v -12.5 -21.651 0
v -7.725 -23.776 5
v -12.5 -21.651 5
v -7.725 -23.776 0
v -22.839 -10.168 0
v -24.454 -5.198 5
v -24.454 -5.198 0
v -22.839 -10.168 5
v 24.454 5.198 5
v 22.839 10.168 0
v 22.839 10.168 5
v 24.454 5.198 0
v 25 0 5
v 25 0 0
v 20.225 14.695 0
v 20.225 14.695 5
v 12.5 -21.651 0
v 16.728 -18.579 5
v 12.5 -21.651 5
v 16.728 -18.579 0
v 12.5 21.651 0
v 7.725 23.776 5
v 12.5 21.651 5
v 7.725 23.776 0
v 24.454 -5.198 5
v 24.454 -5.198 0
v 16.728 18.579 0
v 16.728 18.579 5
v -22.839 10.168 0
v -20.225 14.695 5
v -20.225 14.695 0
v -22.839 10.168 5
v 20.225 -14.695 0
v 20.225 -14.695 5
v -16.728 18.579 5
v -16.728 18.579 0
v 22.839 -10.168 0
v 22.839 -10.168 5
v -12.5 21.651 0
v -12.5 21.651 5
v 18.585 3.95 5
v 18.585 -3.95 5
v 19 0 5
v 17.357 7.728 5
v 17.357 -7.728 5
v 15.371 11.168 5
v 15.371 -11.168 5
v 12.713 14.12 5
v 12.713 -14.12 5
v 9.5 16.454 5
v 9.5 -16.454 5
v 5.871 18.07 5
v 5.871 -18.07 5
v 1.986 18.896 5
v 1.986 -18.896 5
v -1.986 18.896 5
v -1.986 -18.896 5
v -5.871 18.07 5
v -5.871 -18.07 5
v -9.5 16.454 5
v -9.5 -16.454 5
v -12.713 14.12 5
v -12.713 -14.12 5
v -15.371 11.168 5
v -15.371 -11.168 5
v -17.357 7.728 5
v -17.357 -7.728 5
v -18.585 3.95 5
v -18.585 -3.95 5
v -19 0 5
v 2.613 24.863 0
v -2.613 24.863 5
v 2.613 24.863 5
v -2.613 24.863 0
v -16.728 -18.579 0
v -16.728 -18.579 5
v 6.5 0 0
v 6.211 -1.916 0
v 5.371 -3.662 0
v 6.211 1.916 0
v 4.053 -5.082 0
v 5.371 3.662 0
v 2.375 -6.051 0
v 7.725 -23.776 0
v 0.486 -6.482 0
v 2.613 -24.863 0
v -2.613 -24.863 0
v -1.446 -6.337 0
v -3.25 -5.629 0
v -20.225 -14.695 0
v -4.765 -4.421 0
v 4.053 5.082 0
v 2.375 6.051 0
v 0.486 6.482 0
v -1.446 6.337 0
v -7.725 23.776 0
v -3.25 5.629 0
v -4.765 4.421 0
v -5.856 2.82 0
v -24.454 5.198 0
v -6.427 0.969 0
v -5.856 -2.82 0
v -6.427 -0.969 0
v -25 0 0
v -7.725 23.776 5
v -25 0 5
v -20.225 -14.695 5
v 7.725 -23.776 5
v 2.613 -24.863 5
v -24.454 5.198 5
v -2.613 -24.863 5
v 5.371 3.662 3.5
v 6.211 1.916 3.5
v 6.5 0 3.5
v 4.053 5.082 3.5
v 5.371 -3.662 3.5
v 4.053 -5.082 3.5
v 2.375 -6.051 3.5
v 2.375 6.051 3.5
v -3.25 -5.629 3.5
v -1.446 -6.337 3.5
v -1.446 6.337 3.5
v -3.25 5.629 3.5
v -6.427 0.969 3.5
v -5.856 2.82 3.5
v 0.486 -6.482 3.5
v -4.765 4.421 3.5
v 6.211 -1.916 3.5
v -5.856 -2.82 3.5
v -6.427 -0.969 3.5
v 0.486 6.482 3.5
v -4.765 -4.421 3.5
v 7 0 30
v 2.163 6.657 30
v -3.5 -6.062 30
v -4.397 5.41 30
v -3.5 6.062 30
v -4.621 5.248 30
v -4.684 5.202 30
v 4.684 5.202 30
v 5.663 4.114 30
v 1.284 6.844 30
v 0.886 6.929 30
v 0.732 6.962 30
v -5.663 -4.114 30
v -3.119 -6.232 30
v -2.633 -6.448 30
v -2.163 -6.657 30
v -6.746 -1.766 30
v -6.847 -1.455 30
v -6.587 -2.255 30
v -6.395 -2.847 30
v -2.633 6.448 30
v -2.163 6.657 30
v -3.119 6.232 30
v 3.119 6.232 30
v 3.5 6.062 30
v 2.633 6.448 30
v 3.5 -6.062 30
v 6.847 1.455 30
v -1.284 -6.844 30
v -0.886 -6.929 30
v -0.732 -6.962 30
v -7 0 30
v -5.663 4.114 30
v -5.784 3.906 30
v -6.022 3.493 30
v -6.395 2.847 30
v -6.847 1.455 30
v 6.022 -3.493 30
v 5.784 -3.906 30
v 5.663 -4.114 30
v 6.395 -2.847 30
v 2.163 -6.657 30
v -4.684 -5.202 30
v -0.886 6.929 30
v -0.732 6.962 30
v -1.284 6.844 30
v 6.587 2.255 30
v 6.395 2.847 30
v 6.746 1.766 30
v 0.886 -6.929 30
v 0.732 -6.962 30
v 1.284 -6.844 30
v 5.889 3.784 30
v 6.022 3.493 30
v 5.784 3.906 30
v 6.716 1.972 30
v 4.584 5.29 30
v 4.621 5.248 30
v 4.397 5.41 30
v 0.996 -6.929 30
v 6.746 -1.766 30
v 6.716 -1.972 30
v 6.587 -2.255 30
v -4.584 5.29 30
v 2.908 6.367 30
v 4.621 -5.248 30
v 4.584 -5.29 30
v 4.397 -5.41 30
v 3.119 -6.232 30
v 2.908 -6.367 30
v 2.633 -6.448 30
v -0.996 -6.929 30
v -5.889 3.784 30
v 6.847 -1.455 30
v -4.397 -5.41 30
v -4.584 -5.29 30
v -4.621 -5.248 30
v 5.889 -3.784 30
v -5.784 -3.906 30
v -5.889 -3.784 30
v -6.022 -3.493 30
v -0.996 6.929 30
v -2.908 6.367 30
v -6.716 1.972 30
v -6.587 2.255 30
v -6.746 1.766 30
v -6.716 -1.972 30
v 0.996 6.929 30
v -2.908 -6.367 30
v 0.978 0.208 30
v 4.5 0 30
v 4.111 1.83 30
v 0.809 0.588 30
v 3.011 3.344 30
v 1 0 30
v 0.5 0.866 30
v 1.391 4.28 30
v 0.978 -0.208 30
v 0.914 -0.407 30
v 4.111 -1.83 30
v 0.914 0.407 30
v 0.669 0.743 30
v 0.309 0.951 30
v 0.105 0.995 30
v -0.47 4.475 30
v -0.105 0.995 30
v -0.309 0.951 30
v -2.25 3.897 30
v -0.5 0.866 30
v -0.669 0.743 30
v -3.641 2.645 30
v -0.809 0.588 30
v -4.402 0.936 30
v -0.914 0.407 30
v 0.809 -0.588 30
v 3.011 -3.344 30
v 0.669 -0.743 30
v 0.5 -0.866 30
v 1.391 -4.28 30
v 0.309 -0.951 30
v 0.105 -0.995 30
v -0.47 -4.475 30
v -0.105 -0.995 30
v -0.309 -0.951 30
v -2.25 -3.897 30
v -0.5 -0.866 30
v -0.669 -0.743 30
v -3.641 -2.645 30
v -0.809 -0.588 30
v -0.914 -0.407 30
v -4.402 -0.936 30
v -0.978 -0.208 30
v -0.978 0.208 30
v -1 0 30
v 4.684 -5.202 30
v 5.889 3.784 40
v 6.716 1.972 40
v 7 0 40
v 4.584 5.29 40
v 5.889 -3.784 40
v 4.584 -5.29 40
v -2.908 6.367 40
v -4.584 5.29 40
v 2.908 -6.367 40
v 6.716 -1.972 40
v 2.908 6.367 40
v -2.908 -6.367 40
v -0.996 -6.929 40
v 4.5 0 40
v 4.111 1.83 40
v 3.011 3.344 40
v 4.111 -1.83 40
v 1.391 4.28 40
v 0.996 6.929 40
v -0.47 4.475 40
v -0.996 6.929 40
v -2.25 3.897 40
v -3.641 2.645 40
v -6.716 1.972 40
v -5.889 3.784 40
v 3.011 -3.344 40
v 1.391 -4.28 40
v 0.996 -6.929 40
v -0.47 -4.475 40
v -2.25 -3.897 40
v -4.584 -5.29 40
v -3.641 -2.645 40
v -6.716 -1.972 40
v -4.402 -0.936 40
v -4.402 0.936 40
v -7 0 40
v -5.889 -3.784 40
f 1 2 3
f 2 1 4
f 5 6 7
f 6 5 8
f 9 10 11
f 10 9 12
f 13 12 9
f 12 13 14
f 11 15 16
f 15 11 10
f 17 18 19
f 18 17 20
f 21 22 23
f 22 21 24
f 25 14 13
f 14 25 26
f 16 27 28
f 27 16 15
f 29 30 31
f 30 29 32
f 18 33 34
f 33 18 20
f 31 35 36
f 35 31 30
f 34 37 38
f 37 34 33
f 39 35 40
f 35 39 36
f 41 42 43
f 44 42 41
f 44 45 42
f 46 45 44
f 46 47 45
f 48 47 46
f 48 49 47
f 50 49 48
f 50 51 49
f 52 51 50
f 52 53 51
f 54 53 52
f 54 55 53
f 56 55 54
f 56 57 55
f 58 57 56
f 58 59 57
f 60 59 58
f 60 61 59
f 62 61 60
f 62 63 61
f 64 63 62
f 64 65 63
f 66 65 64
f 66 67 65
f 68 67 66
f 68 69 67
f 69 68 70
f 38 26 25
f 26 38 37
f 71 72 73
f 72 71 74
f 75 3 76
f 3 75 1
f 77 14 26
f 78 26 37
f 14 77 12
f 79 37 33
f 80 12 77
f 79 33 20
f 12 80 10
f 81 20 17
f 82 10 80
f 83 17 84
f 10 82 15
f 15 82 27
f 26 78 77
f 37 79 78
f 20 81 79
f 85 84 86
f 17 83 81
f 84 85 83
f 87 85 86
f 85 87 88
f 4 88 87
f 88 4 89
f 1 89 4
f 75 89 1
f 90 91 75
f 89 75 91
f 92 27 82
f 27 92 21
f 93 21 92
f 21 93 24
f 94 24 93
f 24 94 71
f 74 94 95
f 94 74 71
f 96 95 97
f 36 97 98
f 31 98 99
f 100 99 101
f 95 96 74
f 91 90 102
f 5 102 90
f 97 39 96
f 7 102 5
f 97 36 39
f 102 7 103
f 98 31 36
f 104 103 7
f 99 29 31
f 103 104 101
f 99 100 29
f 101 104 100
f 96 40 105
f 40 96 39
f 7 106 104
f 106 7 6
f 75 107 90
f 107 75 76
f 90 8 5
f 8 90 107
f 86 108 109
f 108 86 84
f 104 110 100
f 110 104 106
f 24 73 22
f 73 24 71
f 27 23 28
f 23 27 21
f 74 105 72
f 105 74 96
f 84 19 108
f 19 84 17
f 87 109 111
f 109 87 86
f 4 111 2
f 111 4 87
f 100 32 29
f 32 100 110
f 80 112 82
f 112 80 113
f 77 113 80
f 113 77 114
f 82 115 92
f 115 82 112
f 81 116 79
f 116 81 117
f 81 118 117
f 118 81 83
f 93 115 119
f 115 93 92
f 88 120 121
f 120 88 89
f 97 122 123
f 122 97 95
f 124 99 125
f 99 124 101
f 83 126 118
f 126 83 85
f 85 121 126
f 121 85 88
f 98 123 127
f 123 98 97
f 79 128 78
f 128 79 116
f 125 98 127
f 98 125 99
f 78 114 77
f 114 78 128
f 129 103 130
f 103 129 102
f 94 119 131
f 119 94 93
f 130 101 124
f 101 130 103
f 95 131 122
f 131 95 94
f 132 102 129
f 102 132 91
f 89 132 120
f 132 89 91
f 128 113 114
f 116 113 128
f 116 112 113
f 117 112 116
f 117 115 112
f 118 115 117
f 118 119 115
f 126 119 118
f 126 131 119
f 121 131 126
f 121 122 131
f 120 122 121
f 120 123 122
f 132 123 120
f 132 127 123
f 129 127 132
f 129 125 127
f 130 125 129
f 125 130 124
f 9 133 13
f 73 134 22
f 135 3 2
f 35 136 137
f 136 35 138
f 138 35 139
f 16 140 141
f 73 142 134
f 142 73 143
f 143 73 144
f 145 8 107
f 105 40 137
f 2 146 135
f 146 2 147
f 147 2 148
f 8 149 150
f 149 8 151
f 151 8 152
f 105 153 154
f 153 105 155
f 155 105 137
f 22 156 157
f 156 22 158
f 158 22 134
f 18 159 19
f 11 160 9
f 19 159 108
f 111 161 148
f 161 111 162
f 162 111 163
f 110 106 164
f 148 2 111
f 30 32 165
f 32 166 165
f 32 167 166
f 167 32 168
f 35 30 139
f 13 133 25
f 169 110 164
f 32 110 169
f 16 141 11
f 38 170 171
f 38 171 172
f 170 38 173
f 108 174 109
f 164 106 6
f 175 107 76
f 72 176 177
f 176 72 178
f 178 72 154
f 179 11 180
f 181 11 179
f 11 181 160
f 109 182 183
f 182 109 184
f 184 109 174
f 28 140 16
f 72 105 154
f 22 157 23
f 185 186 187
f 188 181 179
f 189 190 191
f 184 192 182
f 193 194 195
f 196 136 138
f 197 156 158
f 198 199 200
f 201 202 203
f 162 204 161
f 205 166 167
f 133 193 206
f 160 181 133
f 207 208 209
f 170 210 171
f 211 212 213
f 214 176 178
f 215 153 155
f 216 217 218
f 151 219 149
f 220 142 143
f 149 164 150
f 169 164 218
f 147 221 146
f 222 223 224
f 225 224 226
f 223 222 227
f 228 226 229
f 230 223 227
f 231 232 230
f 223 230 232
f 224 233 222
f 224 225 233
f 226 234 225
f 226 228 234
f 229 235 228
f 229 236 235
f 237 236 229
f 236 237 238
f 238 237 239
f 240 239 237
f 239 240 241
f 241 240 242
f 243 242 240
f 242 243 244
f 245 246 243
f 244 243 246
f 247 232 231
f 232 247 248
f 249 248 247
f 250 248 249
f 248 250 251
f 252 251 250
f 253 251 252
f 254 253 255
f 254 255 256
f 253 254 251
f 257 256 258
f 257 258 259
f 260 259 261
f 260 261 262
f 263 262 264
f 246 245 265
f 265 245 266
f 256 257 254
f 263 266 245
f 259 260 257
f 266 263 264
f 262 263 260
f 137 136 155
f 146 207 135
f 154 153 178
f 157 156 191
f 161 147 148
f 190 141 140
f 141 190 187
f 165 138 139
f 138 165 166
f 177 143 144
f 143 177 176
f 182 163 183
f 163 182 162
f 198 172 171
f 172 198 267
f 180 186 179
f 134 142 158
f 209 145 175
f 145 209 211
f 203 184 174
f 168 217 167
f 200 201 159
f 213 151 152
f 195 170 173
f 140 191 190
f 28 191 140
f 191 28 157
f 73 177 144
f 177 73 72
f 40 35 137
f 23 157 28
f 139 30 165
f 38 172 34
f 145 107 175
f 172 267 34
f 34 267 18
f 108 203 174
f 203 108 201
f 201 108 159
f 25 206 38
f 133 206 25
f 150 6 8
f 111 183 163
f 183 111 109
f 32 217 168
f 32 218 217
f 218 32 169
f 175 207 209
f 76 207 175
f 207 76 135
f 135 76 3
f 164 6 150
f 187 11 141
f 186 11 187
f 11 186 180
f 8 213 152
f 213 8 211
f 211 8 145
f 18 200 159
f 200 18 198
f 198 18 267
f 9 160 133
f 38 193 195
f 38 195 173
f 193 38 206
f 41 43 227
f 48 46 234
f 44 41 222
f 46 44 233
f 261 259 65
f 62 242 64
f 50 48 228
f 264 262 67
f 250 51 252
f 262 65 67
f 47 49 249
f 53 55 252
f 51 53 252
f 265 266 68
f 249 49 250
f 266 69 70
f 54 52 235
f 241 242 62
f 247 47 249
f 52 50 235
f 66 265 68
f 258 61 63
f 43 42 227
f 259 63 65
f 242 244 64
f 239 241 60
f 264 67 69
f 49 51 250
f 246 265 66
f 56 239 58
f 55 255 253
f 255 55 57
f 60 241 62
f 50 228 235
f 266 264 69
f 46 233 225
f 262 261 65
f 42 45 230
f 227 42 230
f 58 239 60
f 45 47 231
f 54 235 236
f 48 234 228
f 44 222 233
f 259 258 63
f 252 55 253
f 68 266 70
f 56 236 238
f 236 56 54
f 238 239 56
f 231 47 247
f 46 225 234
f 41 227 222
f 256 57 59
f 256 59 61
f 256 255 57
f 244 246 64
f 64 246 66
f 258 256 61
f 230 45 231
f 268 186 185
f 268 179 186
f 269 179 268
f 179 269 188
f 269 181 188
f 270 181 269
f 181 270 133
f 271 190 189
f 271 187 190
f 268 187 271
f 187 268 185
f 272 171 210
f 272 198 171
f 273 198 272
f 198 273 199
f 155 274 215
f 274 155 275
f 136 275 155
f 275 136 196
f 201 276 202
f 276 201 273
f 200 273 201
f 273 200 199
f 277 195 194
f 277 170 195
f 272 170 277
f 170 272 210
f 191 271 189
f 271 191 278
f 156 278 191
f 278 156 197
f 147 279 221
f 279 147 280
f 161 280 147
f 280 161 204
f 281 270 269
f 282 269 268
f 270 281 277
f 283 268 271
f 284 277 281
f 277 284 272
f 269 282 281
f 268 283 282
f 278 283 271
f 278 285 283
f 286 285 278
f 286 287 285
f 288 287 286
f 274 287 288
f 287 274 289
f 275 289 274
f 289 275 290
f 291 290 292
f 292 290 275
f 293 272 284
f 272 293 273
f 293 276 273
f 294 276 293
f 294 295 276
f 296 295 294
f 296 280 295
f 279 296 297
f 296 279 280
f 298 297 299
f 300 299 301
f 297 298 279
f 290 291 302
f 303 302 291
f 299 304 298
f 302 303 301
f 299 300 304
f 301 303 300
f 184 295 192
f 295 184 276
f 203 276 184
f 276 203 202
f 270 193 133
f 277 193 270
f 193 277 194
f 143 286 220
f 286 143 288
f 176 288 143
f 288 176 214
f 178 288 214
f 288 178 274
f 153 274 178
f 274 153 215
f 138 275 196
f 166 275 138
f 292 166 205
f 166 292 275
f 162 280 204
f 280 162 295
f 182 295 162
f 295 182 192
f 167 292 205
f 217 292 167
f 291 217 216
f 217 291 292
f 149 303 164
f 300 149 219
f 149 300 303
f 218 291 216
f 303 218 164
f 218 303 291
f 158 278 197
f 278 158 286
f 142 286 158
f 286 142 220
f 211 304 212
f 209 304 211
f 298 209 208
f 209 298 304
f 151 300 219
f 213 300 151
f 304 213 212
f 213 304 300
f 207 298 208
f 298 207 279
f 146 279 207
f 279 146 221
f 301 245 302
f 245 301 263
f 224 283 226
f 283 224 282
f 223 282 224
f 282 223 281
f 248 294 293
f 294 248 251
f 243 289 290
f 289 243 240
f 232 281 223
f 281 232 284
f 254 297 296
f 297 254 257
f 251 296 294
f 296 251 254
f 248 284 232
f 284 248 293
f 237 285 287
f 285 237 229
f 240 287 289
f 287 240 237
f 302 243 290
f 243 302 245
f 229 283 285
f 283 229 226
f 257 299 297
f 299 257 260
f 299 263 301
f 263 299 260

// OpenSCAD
//Optics base with and without magnet

X=50; //Base Diameter
Y=25;  //Base Height
d=8; //Guide Rod Diameter
q=13; //Magnet Diameter
r=3.5; //Magnet Thickness
magnet_hole = true;// Change this true to false to remove the Hole for the Magnet

base_large();

module base_large(){
if (magnet_hole==true){
difference(){
cylinder(Y/5,X/2,X/2);
cylinder(r,q/2,q/2);
}
}else{
cylinder(Y/5,X/2,X/2);
}

difference(){
translate([0,0,Y/5])cylinder((Y),X/2,(d+6)/2);
translate([0,0,Y/5])cylinder((Y),(X/2)-6,((d+6)/2)-6);
}
difference(){
translate([0,0,Y/5+Y])cylinder((Y/5)*2,(d+6)/2,(d+6)/2);
translate([0,0,Y/5+Y])cylinder((Y/5)*2,(d+1)/2,(d+1)/2);
}
}
